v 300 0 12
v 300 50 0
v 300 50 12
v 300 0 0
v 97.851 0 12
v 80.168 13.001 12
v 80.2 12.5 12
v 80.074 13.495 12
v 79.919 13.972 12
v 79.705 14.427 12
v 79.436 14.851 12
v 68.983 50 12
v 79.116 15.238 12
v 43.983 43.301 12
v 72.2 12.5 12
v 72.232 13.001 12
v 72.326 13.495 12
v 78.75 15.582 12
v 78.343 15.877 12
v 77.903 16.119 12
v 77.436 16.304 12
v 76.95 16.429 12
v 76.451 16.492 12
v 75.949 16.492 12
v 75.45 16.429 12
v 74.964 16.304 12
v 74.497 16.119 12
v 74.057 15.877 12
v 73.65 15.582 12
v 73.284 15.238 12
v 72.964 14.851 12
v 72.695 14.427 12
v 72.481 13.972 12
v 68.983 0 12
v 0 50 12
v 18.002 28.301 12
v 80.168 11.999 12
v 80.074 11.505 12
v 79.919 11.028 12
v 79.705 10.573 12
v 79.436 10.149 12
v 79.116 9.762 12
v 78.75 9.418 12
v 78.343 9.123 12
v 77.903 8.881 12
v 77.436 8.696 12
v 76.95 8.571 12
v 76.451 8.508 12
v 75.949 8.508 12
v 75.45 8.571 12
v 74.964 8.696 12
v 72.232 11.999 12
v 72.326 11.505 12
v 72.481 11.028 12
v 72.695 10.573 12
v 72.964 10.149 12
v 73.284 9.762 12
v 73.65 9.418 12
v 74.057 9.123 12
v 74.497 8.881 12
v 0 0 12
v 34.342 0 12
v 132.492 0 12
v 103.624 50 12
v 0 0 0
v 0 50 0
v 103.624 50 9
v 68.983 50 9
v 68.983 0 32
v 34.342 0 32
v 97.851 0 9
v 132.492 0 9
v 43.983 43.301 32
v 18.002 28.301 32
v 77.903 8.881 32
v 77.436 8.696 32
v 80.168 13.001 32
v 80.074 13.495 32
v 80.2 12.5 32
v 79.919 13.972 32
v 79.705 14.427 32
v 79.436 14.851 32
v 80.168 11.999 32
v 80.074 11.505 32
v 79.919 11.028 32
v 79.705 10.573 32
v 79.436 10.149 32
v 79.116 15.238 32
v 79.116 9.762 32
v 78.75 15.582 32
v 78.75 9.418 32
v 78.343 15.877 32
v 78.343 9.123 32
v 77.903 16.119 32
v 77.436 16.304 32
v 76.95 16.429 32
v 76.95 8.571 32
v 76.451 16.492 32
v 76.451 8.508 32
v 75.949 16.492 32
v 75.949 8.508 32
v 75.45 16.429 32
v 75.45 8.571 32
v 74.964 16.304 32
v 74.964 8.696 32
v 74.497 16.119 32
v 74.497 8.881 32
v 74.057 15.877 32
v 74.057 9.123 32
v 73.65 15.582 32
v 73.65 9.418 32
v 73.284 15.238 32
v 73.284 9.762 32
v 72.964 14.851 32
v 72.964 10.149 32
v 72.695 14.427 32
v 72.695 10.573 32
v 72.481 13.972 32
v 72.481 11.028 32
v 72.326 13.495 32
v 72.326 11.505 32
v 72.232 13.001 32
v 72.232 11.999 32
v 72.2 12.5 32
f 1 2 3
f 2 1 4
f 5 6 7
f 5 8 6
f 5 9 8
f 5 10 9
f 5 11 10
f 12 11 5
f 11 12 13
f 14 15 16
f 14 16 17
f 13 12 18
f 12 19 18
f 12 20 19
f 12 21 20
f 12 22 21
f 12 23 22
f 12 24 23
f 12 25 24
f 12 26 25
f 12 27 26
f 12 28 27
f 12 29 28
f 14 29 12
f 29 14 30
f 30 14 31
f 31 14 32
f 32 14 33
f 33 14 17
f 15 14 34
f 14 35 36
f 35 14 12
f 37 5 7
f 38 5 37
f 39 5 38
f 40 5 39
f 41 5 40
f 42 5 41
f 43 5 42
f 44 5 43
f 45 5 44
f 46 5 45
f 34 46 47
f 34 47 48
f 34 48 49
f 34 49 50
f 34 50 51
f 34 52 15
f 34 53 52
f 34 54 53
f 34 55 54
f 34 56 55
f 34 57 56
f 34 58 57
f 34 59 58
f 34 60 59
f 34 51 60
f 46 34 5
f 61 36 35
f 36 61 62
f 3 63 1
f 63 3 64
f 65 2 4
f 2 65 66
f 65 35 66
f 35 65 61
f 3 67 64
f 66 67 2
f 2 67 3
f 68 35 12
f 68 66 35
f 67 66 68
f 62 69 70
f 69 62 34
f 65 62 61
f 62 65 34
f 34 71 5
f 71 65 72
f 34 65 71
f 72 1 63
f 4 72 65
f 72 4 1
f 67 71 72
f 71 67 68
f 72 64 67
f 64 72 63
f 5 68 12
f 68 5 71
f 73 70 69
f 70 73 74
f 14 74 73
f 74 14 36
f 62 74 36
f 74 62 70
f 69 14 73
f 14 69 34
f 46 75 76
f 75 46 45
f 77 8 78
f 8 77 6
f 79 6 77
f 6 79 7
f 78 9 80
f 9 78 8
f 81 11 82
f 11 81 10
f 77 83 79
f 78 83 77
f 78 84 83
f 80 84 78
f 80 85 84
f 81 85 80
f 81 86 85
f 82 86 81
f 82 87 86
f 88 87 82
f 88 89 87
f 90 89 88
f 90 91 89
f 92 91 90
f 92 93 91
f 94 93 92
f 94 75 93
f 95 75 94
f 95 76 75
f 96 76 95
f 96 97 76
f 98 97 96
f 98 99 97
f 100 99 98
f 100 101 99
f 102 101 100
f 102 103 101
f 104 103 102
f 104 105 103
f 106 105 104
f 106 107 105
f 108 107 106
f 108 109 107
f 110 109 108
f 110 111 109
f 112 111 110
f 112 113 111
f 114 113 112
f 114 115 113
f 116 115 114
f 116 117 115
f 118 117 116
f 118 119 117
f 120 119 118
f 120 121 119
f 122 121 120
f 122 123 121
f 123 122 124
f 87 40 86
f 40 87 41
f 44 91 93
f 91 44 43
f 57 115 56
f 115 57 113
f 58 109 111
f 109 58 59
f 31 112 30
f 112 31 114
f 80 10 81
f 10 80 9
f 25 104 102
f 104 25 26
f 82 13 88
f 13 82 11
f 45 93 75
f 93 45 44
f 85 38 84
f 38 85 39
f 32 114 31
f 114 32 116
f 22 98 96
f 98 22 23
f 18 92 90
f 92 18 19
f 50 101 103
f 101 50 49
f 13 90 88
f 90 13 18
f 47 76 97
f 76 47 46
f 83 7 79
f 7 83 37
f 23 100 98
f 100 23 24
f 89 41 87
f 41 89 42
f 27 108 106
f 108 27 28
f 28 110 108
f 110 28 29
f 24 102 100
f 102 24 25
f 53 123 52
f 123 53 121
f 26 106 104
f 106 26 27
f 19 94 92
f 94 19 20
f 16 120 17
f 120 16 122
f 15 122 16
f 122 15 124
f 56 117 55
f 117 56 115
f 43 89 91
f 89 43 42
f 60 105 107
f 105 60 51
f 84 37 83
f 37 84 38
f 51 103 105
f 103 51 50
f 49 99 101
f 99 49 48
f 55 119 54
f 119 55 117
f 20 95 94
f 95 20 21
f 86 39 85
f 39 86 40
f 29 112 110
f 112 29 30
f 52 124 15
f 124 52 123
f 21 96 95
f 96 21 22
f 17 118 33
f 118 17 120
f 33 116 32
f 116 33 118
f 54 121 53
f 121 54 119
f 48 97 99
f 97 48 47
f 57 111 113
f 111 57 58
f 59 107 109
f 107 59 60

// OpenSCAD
// Hexagon Nut Table Saw Jig
// Parameters for the jig

jig_thickness = 12; // Thickness of the base plate
dowel_height = 20; // Height of the dowel pin
outer_diameter = 25; // Face to face diameter of hexagon
inner_hole_diameter = 8; // Diameter of the center hole

// Calculated dimensions
jig_width = outer_diameter + 25; // Width of the jig base
jig_length = 300; // Length of the jig base
dowel_offset_from_top = 76.2; // 3 inches in mm
dowel_offset_from_left = outer_diameter / 2; // Center of hexagon from left edge

poop = 0.01;

module hexagon_jig() {

    
    // Angled fence for hexagon cutting
    // The fence is positioned to guide the workpiece at the correct angle
    fence_thickness = 30;
    fence_length = 100;
    corner_to_corner = outer_diameter * 1.1547; // cos(30°) = 0.866, so 1/cos(30°) = 1.1547


    difference() {
        // Main base plate
        cube([jig_length, jig_width, jig_thickness]);
        
        // Dowel hole
        //translate([dowel_offset_from_top, dowel_offset_from_left, 0]) {
        //    cylinder(h = jig_thickness, d = inner_hole_diameter, $fn = 50);
        //}


        // create recess for the rest of the hexagon
        /*
        translate([dowel_offset_from_top, dowel_offset_from_left, jig_thickness-3])
            rotate([0, 0, 90])
                // now translate at a -120 degree angle by corner_to_corner/2
                translate([0,corner_to_corner/2, 0])
                    rotate([0, 0, -30])
                        cube([jig_width, fence_thickness, 3+poop]);
        */

        // create recess for second fence
        translate([dowel_offset_from_top, dowel_offset_from_left, jig_thickness-3])
            rotate([0, 0, 60])
                // now translate at a -120 degree angle by corner_to_corner/2
                translate([corner_to_corner/2, 0,0])
                    rotate([0, 0, -120])
                        translate([-jig_width, 0, 0])
                            cube([jig_width*2, fence_thickness, 3+poop]);

    }


    
    // Dowel pin
    translate([dowel_offset_from_top, dowel_offset_from_left, jig_thickness]) {
        cylinder(h = dowel_height, d = inner_hole_diameter, $fn = 50);
    }
    
    // hexagon face length
    face_length = outer_diameter * 1.1547; // cos(30°) = 0.866, so 1/cos(30°) = 1.1547

    
    // Position fence by rotating 120° and translating from dowel center
    // to the corner-to-corner distance at -120° angle
    
    
    
    difference(){
        union(){
            translate([dowel_offset_from_top, dowel_offset_from_left, 0])
                rotate([0, 0, -120])
                    // now translate at a -120 degree angle by corner_to_corner/2
                    translate([corner_to_corner/2, 0,0])
                        rotate([0, 0, -120])
                            cube([jig_width, fence_thickness, dowel_height+jig_thickness]);

            /* second fence
            translate([dowel_offset_from_top, dowel_offset_from_left, 0])
                rotate([0, 0, 60])
                    // now translate at a -120 degree angle by corner_to_corner/2
                    translate([corner_to_corner/2, 0,0])
                        rotate([0, 0, -120])
                            translate([-jig_width, 0, 0])
                                cube([jig_width*2, fence_thickness, dowel_height+jig_thickness]);
            */
        }
        

        // crop off stuff overhanging the jig
        translate([0,-jig_width,-poop])
            cube([jig_length, jig_width, 100]);
        translate([0,jig_width,-poop])
            cube([jig_length, jig_width, 100]);
        
        
    }

}
// Render the jig
hexagon_jig();
